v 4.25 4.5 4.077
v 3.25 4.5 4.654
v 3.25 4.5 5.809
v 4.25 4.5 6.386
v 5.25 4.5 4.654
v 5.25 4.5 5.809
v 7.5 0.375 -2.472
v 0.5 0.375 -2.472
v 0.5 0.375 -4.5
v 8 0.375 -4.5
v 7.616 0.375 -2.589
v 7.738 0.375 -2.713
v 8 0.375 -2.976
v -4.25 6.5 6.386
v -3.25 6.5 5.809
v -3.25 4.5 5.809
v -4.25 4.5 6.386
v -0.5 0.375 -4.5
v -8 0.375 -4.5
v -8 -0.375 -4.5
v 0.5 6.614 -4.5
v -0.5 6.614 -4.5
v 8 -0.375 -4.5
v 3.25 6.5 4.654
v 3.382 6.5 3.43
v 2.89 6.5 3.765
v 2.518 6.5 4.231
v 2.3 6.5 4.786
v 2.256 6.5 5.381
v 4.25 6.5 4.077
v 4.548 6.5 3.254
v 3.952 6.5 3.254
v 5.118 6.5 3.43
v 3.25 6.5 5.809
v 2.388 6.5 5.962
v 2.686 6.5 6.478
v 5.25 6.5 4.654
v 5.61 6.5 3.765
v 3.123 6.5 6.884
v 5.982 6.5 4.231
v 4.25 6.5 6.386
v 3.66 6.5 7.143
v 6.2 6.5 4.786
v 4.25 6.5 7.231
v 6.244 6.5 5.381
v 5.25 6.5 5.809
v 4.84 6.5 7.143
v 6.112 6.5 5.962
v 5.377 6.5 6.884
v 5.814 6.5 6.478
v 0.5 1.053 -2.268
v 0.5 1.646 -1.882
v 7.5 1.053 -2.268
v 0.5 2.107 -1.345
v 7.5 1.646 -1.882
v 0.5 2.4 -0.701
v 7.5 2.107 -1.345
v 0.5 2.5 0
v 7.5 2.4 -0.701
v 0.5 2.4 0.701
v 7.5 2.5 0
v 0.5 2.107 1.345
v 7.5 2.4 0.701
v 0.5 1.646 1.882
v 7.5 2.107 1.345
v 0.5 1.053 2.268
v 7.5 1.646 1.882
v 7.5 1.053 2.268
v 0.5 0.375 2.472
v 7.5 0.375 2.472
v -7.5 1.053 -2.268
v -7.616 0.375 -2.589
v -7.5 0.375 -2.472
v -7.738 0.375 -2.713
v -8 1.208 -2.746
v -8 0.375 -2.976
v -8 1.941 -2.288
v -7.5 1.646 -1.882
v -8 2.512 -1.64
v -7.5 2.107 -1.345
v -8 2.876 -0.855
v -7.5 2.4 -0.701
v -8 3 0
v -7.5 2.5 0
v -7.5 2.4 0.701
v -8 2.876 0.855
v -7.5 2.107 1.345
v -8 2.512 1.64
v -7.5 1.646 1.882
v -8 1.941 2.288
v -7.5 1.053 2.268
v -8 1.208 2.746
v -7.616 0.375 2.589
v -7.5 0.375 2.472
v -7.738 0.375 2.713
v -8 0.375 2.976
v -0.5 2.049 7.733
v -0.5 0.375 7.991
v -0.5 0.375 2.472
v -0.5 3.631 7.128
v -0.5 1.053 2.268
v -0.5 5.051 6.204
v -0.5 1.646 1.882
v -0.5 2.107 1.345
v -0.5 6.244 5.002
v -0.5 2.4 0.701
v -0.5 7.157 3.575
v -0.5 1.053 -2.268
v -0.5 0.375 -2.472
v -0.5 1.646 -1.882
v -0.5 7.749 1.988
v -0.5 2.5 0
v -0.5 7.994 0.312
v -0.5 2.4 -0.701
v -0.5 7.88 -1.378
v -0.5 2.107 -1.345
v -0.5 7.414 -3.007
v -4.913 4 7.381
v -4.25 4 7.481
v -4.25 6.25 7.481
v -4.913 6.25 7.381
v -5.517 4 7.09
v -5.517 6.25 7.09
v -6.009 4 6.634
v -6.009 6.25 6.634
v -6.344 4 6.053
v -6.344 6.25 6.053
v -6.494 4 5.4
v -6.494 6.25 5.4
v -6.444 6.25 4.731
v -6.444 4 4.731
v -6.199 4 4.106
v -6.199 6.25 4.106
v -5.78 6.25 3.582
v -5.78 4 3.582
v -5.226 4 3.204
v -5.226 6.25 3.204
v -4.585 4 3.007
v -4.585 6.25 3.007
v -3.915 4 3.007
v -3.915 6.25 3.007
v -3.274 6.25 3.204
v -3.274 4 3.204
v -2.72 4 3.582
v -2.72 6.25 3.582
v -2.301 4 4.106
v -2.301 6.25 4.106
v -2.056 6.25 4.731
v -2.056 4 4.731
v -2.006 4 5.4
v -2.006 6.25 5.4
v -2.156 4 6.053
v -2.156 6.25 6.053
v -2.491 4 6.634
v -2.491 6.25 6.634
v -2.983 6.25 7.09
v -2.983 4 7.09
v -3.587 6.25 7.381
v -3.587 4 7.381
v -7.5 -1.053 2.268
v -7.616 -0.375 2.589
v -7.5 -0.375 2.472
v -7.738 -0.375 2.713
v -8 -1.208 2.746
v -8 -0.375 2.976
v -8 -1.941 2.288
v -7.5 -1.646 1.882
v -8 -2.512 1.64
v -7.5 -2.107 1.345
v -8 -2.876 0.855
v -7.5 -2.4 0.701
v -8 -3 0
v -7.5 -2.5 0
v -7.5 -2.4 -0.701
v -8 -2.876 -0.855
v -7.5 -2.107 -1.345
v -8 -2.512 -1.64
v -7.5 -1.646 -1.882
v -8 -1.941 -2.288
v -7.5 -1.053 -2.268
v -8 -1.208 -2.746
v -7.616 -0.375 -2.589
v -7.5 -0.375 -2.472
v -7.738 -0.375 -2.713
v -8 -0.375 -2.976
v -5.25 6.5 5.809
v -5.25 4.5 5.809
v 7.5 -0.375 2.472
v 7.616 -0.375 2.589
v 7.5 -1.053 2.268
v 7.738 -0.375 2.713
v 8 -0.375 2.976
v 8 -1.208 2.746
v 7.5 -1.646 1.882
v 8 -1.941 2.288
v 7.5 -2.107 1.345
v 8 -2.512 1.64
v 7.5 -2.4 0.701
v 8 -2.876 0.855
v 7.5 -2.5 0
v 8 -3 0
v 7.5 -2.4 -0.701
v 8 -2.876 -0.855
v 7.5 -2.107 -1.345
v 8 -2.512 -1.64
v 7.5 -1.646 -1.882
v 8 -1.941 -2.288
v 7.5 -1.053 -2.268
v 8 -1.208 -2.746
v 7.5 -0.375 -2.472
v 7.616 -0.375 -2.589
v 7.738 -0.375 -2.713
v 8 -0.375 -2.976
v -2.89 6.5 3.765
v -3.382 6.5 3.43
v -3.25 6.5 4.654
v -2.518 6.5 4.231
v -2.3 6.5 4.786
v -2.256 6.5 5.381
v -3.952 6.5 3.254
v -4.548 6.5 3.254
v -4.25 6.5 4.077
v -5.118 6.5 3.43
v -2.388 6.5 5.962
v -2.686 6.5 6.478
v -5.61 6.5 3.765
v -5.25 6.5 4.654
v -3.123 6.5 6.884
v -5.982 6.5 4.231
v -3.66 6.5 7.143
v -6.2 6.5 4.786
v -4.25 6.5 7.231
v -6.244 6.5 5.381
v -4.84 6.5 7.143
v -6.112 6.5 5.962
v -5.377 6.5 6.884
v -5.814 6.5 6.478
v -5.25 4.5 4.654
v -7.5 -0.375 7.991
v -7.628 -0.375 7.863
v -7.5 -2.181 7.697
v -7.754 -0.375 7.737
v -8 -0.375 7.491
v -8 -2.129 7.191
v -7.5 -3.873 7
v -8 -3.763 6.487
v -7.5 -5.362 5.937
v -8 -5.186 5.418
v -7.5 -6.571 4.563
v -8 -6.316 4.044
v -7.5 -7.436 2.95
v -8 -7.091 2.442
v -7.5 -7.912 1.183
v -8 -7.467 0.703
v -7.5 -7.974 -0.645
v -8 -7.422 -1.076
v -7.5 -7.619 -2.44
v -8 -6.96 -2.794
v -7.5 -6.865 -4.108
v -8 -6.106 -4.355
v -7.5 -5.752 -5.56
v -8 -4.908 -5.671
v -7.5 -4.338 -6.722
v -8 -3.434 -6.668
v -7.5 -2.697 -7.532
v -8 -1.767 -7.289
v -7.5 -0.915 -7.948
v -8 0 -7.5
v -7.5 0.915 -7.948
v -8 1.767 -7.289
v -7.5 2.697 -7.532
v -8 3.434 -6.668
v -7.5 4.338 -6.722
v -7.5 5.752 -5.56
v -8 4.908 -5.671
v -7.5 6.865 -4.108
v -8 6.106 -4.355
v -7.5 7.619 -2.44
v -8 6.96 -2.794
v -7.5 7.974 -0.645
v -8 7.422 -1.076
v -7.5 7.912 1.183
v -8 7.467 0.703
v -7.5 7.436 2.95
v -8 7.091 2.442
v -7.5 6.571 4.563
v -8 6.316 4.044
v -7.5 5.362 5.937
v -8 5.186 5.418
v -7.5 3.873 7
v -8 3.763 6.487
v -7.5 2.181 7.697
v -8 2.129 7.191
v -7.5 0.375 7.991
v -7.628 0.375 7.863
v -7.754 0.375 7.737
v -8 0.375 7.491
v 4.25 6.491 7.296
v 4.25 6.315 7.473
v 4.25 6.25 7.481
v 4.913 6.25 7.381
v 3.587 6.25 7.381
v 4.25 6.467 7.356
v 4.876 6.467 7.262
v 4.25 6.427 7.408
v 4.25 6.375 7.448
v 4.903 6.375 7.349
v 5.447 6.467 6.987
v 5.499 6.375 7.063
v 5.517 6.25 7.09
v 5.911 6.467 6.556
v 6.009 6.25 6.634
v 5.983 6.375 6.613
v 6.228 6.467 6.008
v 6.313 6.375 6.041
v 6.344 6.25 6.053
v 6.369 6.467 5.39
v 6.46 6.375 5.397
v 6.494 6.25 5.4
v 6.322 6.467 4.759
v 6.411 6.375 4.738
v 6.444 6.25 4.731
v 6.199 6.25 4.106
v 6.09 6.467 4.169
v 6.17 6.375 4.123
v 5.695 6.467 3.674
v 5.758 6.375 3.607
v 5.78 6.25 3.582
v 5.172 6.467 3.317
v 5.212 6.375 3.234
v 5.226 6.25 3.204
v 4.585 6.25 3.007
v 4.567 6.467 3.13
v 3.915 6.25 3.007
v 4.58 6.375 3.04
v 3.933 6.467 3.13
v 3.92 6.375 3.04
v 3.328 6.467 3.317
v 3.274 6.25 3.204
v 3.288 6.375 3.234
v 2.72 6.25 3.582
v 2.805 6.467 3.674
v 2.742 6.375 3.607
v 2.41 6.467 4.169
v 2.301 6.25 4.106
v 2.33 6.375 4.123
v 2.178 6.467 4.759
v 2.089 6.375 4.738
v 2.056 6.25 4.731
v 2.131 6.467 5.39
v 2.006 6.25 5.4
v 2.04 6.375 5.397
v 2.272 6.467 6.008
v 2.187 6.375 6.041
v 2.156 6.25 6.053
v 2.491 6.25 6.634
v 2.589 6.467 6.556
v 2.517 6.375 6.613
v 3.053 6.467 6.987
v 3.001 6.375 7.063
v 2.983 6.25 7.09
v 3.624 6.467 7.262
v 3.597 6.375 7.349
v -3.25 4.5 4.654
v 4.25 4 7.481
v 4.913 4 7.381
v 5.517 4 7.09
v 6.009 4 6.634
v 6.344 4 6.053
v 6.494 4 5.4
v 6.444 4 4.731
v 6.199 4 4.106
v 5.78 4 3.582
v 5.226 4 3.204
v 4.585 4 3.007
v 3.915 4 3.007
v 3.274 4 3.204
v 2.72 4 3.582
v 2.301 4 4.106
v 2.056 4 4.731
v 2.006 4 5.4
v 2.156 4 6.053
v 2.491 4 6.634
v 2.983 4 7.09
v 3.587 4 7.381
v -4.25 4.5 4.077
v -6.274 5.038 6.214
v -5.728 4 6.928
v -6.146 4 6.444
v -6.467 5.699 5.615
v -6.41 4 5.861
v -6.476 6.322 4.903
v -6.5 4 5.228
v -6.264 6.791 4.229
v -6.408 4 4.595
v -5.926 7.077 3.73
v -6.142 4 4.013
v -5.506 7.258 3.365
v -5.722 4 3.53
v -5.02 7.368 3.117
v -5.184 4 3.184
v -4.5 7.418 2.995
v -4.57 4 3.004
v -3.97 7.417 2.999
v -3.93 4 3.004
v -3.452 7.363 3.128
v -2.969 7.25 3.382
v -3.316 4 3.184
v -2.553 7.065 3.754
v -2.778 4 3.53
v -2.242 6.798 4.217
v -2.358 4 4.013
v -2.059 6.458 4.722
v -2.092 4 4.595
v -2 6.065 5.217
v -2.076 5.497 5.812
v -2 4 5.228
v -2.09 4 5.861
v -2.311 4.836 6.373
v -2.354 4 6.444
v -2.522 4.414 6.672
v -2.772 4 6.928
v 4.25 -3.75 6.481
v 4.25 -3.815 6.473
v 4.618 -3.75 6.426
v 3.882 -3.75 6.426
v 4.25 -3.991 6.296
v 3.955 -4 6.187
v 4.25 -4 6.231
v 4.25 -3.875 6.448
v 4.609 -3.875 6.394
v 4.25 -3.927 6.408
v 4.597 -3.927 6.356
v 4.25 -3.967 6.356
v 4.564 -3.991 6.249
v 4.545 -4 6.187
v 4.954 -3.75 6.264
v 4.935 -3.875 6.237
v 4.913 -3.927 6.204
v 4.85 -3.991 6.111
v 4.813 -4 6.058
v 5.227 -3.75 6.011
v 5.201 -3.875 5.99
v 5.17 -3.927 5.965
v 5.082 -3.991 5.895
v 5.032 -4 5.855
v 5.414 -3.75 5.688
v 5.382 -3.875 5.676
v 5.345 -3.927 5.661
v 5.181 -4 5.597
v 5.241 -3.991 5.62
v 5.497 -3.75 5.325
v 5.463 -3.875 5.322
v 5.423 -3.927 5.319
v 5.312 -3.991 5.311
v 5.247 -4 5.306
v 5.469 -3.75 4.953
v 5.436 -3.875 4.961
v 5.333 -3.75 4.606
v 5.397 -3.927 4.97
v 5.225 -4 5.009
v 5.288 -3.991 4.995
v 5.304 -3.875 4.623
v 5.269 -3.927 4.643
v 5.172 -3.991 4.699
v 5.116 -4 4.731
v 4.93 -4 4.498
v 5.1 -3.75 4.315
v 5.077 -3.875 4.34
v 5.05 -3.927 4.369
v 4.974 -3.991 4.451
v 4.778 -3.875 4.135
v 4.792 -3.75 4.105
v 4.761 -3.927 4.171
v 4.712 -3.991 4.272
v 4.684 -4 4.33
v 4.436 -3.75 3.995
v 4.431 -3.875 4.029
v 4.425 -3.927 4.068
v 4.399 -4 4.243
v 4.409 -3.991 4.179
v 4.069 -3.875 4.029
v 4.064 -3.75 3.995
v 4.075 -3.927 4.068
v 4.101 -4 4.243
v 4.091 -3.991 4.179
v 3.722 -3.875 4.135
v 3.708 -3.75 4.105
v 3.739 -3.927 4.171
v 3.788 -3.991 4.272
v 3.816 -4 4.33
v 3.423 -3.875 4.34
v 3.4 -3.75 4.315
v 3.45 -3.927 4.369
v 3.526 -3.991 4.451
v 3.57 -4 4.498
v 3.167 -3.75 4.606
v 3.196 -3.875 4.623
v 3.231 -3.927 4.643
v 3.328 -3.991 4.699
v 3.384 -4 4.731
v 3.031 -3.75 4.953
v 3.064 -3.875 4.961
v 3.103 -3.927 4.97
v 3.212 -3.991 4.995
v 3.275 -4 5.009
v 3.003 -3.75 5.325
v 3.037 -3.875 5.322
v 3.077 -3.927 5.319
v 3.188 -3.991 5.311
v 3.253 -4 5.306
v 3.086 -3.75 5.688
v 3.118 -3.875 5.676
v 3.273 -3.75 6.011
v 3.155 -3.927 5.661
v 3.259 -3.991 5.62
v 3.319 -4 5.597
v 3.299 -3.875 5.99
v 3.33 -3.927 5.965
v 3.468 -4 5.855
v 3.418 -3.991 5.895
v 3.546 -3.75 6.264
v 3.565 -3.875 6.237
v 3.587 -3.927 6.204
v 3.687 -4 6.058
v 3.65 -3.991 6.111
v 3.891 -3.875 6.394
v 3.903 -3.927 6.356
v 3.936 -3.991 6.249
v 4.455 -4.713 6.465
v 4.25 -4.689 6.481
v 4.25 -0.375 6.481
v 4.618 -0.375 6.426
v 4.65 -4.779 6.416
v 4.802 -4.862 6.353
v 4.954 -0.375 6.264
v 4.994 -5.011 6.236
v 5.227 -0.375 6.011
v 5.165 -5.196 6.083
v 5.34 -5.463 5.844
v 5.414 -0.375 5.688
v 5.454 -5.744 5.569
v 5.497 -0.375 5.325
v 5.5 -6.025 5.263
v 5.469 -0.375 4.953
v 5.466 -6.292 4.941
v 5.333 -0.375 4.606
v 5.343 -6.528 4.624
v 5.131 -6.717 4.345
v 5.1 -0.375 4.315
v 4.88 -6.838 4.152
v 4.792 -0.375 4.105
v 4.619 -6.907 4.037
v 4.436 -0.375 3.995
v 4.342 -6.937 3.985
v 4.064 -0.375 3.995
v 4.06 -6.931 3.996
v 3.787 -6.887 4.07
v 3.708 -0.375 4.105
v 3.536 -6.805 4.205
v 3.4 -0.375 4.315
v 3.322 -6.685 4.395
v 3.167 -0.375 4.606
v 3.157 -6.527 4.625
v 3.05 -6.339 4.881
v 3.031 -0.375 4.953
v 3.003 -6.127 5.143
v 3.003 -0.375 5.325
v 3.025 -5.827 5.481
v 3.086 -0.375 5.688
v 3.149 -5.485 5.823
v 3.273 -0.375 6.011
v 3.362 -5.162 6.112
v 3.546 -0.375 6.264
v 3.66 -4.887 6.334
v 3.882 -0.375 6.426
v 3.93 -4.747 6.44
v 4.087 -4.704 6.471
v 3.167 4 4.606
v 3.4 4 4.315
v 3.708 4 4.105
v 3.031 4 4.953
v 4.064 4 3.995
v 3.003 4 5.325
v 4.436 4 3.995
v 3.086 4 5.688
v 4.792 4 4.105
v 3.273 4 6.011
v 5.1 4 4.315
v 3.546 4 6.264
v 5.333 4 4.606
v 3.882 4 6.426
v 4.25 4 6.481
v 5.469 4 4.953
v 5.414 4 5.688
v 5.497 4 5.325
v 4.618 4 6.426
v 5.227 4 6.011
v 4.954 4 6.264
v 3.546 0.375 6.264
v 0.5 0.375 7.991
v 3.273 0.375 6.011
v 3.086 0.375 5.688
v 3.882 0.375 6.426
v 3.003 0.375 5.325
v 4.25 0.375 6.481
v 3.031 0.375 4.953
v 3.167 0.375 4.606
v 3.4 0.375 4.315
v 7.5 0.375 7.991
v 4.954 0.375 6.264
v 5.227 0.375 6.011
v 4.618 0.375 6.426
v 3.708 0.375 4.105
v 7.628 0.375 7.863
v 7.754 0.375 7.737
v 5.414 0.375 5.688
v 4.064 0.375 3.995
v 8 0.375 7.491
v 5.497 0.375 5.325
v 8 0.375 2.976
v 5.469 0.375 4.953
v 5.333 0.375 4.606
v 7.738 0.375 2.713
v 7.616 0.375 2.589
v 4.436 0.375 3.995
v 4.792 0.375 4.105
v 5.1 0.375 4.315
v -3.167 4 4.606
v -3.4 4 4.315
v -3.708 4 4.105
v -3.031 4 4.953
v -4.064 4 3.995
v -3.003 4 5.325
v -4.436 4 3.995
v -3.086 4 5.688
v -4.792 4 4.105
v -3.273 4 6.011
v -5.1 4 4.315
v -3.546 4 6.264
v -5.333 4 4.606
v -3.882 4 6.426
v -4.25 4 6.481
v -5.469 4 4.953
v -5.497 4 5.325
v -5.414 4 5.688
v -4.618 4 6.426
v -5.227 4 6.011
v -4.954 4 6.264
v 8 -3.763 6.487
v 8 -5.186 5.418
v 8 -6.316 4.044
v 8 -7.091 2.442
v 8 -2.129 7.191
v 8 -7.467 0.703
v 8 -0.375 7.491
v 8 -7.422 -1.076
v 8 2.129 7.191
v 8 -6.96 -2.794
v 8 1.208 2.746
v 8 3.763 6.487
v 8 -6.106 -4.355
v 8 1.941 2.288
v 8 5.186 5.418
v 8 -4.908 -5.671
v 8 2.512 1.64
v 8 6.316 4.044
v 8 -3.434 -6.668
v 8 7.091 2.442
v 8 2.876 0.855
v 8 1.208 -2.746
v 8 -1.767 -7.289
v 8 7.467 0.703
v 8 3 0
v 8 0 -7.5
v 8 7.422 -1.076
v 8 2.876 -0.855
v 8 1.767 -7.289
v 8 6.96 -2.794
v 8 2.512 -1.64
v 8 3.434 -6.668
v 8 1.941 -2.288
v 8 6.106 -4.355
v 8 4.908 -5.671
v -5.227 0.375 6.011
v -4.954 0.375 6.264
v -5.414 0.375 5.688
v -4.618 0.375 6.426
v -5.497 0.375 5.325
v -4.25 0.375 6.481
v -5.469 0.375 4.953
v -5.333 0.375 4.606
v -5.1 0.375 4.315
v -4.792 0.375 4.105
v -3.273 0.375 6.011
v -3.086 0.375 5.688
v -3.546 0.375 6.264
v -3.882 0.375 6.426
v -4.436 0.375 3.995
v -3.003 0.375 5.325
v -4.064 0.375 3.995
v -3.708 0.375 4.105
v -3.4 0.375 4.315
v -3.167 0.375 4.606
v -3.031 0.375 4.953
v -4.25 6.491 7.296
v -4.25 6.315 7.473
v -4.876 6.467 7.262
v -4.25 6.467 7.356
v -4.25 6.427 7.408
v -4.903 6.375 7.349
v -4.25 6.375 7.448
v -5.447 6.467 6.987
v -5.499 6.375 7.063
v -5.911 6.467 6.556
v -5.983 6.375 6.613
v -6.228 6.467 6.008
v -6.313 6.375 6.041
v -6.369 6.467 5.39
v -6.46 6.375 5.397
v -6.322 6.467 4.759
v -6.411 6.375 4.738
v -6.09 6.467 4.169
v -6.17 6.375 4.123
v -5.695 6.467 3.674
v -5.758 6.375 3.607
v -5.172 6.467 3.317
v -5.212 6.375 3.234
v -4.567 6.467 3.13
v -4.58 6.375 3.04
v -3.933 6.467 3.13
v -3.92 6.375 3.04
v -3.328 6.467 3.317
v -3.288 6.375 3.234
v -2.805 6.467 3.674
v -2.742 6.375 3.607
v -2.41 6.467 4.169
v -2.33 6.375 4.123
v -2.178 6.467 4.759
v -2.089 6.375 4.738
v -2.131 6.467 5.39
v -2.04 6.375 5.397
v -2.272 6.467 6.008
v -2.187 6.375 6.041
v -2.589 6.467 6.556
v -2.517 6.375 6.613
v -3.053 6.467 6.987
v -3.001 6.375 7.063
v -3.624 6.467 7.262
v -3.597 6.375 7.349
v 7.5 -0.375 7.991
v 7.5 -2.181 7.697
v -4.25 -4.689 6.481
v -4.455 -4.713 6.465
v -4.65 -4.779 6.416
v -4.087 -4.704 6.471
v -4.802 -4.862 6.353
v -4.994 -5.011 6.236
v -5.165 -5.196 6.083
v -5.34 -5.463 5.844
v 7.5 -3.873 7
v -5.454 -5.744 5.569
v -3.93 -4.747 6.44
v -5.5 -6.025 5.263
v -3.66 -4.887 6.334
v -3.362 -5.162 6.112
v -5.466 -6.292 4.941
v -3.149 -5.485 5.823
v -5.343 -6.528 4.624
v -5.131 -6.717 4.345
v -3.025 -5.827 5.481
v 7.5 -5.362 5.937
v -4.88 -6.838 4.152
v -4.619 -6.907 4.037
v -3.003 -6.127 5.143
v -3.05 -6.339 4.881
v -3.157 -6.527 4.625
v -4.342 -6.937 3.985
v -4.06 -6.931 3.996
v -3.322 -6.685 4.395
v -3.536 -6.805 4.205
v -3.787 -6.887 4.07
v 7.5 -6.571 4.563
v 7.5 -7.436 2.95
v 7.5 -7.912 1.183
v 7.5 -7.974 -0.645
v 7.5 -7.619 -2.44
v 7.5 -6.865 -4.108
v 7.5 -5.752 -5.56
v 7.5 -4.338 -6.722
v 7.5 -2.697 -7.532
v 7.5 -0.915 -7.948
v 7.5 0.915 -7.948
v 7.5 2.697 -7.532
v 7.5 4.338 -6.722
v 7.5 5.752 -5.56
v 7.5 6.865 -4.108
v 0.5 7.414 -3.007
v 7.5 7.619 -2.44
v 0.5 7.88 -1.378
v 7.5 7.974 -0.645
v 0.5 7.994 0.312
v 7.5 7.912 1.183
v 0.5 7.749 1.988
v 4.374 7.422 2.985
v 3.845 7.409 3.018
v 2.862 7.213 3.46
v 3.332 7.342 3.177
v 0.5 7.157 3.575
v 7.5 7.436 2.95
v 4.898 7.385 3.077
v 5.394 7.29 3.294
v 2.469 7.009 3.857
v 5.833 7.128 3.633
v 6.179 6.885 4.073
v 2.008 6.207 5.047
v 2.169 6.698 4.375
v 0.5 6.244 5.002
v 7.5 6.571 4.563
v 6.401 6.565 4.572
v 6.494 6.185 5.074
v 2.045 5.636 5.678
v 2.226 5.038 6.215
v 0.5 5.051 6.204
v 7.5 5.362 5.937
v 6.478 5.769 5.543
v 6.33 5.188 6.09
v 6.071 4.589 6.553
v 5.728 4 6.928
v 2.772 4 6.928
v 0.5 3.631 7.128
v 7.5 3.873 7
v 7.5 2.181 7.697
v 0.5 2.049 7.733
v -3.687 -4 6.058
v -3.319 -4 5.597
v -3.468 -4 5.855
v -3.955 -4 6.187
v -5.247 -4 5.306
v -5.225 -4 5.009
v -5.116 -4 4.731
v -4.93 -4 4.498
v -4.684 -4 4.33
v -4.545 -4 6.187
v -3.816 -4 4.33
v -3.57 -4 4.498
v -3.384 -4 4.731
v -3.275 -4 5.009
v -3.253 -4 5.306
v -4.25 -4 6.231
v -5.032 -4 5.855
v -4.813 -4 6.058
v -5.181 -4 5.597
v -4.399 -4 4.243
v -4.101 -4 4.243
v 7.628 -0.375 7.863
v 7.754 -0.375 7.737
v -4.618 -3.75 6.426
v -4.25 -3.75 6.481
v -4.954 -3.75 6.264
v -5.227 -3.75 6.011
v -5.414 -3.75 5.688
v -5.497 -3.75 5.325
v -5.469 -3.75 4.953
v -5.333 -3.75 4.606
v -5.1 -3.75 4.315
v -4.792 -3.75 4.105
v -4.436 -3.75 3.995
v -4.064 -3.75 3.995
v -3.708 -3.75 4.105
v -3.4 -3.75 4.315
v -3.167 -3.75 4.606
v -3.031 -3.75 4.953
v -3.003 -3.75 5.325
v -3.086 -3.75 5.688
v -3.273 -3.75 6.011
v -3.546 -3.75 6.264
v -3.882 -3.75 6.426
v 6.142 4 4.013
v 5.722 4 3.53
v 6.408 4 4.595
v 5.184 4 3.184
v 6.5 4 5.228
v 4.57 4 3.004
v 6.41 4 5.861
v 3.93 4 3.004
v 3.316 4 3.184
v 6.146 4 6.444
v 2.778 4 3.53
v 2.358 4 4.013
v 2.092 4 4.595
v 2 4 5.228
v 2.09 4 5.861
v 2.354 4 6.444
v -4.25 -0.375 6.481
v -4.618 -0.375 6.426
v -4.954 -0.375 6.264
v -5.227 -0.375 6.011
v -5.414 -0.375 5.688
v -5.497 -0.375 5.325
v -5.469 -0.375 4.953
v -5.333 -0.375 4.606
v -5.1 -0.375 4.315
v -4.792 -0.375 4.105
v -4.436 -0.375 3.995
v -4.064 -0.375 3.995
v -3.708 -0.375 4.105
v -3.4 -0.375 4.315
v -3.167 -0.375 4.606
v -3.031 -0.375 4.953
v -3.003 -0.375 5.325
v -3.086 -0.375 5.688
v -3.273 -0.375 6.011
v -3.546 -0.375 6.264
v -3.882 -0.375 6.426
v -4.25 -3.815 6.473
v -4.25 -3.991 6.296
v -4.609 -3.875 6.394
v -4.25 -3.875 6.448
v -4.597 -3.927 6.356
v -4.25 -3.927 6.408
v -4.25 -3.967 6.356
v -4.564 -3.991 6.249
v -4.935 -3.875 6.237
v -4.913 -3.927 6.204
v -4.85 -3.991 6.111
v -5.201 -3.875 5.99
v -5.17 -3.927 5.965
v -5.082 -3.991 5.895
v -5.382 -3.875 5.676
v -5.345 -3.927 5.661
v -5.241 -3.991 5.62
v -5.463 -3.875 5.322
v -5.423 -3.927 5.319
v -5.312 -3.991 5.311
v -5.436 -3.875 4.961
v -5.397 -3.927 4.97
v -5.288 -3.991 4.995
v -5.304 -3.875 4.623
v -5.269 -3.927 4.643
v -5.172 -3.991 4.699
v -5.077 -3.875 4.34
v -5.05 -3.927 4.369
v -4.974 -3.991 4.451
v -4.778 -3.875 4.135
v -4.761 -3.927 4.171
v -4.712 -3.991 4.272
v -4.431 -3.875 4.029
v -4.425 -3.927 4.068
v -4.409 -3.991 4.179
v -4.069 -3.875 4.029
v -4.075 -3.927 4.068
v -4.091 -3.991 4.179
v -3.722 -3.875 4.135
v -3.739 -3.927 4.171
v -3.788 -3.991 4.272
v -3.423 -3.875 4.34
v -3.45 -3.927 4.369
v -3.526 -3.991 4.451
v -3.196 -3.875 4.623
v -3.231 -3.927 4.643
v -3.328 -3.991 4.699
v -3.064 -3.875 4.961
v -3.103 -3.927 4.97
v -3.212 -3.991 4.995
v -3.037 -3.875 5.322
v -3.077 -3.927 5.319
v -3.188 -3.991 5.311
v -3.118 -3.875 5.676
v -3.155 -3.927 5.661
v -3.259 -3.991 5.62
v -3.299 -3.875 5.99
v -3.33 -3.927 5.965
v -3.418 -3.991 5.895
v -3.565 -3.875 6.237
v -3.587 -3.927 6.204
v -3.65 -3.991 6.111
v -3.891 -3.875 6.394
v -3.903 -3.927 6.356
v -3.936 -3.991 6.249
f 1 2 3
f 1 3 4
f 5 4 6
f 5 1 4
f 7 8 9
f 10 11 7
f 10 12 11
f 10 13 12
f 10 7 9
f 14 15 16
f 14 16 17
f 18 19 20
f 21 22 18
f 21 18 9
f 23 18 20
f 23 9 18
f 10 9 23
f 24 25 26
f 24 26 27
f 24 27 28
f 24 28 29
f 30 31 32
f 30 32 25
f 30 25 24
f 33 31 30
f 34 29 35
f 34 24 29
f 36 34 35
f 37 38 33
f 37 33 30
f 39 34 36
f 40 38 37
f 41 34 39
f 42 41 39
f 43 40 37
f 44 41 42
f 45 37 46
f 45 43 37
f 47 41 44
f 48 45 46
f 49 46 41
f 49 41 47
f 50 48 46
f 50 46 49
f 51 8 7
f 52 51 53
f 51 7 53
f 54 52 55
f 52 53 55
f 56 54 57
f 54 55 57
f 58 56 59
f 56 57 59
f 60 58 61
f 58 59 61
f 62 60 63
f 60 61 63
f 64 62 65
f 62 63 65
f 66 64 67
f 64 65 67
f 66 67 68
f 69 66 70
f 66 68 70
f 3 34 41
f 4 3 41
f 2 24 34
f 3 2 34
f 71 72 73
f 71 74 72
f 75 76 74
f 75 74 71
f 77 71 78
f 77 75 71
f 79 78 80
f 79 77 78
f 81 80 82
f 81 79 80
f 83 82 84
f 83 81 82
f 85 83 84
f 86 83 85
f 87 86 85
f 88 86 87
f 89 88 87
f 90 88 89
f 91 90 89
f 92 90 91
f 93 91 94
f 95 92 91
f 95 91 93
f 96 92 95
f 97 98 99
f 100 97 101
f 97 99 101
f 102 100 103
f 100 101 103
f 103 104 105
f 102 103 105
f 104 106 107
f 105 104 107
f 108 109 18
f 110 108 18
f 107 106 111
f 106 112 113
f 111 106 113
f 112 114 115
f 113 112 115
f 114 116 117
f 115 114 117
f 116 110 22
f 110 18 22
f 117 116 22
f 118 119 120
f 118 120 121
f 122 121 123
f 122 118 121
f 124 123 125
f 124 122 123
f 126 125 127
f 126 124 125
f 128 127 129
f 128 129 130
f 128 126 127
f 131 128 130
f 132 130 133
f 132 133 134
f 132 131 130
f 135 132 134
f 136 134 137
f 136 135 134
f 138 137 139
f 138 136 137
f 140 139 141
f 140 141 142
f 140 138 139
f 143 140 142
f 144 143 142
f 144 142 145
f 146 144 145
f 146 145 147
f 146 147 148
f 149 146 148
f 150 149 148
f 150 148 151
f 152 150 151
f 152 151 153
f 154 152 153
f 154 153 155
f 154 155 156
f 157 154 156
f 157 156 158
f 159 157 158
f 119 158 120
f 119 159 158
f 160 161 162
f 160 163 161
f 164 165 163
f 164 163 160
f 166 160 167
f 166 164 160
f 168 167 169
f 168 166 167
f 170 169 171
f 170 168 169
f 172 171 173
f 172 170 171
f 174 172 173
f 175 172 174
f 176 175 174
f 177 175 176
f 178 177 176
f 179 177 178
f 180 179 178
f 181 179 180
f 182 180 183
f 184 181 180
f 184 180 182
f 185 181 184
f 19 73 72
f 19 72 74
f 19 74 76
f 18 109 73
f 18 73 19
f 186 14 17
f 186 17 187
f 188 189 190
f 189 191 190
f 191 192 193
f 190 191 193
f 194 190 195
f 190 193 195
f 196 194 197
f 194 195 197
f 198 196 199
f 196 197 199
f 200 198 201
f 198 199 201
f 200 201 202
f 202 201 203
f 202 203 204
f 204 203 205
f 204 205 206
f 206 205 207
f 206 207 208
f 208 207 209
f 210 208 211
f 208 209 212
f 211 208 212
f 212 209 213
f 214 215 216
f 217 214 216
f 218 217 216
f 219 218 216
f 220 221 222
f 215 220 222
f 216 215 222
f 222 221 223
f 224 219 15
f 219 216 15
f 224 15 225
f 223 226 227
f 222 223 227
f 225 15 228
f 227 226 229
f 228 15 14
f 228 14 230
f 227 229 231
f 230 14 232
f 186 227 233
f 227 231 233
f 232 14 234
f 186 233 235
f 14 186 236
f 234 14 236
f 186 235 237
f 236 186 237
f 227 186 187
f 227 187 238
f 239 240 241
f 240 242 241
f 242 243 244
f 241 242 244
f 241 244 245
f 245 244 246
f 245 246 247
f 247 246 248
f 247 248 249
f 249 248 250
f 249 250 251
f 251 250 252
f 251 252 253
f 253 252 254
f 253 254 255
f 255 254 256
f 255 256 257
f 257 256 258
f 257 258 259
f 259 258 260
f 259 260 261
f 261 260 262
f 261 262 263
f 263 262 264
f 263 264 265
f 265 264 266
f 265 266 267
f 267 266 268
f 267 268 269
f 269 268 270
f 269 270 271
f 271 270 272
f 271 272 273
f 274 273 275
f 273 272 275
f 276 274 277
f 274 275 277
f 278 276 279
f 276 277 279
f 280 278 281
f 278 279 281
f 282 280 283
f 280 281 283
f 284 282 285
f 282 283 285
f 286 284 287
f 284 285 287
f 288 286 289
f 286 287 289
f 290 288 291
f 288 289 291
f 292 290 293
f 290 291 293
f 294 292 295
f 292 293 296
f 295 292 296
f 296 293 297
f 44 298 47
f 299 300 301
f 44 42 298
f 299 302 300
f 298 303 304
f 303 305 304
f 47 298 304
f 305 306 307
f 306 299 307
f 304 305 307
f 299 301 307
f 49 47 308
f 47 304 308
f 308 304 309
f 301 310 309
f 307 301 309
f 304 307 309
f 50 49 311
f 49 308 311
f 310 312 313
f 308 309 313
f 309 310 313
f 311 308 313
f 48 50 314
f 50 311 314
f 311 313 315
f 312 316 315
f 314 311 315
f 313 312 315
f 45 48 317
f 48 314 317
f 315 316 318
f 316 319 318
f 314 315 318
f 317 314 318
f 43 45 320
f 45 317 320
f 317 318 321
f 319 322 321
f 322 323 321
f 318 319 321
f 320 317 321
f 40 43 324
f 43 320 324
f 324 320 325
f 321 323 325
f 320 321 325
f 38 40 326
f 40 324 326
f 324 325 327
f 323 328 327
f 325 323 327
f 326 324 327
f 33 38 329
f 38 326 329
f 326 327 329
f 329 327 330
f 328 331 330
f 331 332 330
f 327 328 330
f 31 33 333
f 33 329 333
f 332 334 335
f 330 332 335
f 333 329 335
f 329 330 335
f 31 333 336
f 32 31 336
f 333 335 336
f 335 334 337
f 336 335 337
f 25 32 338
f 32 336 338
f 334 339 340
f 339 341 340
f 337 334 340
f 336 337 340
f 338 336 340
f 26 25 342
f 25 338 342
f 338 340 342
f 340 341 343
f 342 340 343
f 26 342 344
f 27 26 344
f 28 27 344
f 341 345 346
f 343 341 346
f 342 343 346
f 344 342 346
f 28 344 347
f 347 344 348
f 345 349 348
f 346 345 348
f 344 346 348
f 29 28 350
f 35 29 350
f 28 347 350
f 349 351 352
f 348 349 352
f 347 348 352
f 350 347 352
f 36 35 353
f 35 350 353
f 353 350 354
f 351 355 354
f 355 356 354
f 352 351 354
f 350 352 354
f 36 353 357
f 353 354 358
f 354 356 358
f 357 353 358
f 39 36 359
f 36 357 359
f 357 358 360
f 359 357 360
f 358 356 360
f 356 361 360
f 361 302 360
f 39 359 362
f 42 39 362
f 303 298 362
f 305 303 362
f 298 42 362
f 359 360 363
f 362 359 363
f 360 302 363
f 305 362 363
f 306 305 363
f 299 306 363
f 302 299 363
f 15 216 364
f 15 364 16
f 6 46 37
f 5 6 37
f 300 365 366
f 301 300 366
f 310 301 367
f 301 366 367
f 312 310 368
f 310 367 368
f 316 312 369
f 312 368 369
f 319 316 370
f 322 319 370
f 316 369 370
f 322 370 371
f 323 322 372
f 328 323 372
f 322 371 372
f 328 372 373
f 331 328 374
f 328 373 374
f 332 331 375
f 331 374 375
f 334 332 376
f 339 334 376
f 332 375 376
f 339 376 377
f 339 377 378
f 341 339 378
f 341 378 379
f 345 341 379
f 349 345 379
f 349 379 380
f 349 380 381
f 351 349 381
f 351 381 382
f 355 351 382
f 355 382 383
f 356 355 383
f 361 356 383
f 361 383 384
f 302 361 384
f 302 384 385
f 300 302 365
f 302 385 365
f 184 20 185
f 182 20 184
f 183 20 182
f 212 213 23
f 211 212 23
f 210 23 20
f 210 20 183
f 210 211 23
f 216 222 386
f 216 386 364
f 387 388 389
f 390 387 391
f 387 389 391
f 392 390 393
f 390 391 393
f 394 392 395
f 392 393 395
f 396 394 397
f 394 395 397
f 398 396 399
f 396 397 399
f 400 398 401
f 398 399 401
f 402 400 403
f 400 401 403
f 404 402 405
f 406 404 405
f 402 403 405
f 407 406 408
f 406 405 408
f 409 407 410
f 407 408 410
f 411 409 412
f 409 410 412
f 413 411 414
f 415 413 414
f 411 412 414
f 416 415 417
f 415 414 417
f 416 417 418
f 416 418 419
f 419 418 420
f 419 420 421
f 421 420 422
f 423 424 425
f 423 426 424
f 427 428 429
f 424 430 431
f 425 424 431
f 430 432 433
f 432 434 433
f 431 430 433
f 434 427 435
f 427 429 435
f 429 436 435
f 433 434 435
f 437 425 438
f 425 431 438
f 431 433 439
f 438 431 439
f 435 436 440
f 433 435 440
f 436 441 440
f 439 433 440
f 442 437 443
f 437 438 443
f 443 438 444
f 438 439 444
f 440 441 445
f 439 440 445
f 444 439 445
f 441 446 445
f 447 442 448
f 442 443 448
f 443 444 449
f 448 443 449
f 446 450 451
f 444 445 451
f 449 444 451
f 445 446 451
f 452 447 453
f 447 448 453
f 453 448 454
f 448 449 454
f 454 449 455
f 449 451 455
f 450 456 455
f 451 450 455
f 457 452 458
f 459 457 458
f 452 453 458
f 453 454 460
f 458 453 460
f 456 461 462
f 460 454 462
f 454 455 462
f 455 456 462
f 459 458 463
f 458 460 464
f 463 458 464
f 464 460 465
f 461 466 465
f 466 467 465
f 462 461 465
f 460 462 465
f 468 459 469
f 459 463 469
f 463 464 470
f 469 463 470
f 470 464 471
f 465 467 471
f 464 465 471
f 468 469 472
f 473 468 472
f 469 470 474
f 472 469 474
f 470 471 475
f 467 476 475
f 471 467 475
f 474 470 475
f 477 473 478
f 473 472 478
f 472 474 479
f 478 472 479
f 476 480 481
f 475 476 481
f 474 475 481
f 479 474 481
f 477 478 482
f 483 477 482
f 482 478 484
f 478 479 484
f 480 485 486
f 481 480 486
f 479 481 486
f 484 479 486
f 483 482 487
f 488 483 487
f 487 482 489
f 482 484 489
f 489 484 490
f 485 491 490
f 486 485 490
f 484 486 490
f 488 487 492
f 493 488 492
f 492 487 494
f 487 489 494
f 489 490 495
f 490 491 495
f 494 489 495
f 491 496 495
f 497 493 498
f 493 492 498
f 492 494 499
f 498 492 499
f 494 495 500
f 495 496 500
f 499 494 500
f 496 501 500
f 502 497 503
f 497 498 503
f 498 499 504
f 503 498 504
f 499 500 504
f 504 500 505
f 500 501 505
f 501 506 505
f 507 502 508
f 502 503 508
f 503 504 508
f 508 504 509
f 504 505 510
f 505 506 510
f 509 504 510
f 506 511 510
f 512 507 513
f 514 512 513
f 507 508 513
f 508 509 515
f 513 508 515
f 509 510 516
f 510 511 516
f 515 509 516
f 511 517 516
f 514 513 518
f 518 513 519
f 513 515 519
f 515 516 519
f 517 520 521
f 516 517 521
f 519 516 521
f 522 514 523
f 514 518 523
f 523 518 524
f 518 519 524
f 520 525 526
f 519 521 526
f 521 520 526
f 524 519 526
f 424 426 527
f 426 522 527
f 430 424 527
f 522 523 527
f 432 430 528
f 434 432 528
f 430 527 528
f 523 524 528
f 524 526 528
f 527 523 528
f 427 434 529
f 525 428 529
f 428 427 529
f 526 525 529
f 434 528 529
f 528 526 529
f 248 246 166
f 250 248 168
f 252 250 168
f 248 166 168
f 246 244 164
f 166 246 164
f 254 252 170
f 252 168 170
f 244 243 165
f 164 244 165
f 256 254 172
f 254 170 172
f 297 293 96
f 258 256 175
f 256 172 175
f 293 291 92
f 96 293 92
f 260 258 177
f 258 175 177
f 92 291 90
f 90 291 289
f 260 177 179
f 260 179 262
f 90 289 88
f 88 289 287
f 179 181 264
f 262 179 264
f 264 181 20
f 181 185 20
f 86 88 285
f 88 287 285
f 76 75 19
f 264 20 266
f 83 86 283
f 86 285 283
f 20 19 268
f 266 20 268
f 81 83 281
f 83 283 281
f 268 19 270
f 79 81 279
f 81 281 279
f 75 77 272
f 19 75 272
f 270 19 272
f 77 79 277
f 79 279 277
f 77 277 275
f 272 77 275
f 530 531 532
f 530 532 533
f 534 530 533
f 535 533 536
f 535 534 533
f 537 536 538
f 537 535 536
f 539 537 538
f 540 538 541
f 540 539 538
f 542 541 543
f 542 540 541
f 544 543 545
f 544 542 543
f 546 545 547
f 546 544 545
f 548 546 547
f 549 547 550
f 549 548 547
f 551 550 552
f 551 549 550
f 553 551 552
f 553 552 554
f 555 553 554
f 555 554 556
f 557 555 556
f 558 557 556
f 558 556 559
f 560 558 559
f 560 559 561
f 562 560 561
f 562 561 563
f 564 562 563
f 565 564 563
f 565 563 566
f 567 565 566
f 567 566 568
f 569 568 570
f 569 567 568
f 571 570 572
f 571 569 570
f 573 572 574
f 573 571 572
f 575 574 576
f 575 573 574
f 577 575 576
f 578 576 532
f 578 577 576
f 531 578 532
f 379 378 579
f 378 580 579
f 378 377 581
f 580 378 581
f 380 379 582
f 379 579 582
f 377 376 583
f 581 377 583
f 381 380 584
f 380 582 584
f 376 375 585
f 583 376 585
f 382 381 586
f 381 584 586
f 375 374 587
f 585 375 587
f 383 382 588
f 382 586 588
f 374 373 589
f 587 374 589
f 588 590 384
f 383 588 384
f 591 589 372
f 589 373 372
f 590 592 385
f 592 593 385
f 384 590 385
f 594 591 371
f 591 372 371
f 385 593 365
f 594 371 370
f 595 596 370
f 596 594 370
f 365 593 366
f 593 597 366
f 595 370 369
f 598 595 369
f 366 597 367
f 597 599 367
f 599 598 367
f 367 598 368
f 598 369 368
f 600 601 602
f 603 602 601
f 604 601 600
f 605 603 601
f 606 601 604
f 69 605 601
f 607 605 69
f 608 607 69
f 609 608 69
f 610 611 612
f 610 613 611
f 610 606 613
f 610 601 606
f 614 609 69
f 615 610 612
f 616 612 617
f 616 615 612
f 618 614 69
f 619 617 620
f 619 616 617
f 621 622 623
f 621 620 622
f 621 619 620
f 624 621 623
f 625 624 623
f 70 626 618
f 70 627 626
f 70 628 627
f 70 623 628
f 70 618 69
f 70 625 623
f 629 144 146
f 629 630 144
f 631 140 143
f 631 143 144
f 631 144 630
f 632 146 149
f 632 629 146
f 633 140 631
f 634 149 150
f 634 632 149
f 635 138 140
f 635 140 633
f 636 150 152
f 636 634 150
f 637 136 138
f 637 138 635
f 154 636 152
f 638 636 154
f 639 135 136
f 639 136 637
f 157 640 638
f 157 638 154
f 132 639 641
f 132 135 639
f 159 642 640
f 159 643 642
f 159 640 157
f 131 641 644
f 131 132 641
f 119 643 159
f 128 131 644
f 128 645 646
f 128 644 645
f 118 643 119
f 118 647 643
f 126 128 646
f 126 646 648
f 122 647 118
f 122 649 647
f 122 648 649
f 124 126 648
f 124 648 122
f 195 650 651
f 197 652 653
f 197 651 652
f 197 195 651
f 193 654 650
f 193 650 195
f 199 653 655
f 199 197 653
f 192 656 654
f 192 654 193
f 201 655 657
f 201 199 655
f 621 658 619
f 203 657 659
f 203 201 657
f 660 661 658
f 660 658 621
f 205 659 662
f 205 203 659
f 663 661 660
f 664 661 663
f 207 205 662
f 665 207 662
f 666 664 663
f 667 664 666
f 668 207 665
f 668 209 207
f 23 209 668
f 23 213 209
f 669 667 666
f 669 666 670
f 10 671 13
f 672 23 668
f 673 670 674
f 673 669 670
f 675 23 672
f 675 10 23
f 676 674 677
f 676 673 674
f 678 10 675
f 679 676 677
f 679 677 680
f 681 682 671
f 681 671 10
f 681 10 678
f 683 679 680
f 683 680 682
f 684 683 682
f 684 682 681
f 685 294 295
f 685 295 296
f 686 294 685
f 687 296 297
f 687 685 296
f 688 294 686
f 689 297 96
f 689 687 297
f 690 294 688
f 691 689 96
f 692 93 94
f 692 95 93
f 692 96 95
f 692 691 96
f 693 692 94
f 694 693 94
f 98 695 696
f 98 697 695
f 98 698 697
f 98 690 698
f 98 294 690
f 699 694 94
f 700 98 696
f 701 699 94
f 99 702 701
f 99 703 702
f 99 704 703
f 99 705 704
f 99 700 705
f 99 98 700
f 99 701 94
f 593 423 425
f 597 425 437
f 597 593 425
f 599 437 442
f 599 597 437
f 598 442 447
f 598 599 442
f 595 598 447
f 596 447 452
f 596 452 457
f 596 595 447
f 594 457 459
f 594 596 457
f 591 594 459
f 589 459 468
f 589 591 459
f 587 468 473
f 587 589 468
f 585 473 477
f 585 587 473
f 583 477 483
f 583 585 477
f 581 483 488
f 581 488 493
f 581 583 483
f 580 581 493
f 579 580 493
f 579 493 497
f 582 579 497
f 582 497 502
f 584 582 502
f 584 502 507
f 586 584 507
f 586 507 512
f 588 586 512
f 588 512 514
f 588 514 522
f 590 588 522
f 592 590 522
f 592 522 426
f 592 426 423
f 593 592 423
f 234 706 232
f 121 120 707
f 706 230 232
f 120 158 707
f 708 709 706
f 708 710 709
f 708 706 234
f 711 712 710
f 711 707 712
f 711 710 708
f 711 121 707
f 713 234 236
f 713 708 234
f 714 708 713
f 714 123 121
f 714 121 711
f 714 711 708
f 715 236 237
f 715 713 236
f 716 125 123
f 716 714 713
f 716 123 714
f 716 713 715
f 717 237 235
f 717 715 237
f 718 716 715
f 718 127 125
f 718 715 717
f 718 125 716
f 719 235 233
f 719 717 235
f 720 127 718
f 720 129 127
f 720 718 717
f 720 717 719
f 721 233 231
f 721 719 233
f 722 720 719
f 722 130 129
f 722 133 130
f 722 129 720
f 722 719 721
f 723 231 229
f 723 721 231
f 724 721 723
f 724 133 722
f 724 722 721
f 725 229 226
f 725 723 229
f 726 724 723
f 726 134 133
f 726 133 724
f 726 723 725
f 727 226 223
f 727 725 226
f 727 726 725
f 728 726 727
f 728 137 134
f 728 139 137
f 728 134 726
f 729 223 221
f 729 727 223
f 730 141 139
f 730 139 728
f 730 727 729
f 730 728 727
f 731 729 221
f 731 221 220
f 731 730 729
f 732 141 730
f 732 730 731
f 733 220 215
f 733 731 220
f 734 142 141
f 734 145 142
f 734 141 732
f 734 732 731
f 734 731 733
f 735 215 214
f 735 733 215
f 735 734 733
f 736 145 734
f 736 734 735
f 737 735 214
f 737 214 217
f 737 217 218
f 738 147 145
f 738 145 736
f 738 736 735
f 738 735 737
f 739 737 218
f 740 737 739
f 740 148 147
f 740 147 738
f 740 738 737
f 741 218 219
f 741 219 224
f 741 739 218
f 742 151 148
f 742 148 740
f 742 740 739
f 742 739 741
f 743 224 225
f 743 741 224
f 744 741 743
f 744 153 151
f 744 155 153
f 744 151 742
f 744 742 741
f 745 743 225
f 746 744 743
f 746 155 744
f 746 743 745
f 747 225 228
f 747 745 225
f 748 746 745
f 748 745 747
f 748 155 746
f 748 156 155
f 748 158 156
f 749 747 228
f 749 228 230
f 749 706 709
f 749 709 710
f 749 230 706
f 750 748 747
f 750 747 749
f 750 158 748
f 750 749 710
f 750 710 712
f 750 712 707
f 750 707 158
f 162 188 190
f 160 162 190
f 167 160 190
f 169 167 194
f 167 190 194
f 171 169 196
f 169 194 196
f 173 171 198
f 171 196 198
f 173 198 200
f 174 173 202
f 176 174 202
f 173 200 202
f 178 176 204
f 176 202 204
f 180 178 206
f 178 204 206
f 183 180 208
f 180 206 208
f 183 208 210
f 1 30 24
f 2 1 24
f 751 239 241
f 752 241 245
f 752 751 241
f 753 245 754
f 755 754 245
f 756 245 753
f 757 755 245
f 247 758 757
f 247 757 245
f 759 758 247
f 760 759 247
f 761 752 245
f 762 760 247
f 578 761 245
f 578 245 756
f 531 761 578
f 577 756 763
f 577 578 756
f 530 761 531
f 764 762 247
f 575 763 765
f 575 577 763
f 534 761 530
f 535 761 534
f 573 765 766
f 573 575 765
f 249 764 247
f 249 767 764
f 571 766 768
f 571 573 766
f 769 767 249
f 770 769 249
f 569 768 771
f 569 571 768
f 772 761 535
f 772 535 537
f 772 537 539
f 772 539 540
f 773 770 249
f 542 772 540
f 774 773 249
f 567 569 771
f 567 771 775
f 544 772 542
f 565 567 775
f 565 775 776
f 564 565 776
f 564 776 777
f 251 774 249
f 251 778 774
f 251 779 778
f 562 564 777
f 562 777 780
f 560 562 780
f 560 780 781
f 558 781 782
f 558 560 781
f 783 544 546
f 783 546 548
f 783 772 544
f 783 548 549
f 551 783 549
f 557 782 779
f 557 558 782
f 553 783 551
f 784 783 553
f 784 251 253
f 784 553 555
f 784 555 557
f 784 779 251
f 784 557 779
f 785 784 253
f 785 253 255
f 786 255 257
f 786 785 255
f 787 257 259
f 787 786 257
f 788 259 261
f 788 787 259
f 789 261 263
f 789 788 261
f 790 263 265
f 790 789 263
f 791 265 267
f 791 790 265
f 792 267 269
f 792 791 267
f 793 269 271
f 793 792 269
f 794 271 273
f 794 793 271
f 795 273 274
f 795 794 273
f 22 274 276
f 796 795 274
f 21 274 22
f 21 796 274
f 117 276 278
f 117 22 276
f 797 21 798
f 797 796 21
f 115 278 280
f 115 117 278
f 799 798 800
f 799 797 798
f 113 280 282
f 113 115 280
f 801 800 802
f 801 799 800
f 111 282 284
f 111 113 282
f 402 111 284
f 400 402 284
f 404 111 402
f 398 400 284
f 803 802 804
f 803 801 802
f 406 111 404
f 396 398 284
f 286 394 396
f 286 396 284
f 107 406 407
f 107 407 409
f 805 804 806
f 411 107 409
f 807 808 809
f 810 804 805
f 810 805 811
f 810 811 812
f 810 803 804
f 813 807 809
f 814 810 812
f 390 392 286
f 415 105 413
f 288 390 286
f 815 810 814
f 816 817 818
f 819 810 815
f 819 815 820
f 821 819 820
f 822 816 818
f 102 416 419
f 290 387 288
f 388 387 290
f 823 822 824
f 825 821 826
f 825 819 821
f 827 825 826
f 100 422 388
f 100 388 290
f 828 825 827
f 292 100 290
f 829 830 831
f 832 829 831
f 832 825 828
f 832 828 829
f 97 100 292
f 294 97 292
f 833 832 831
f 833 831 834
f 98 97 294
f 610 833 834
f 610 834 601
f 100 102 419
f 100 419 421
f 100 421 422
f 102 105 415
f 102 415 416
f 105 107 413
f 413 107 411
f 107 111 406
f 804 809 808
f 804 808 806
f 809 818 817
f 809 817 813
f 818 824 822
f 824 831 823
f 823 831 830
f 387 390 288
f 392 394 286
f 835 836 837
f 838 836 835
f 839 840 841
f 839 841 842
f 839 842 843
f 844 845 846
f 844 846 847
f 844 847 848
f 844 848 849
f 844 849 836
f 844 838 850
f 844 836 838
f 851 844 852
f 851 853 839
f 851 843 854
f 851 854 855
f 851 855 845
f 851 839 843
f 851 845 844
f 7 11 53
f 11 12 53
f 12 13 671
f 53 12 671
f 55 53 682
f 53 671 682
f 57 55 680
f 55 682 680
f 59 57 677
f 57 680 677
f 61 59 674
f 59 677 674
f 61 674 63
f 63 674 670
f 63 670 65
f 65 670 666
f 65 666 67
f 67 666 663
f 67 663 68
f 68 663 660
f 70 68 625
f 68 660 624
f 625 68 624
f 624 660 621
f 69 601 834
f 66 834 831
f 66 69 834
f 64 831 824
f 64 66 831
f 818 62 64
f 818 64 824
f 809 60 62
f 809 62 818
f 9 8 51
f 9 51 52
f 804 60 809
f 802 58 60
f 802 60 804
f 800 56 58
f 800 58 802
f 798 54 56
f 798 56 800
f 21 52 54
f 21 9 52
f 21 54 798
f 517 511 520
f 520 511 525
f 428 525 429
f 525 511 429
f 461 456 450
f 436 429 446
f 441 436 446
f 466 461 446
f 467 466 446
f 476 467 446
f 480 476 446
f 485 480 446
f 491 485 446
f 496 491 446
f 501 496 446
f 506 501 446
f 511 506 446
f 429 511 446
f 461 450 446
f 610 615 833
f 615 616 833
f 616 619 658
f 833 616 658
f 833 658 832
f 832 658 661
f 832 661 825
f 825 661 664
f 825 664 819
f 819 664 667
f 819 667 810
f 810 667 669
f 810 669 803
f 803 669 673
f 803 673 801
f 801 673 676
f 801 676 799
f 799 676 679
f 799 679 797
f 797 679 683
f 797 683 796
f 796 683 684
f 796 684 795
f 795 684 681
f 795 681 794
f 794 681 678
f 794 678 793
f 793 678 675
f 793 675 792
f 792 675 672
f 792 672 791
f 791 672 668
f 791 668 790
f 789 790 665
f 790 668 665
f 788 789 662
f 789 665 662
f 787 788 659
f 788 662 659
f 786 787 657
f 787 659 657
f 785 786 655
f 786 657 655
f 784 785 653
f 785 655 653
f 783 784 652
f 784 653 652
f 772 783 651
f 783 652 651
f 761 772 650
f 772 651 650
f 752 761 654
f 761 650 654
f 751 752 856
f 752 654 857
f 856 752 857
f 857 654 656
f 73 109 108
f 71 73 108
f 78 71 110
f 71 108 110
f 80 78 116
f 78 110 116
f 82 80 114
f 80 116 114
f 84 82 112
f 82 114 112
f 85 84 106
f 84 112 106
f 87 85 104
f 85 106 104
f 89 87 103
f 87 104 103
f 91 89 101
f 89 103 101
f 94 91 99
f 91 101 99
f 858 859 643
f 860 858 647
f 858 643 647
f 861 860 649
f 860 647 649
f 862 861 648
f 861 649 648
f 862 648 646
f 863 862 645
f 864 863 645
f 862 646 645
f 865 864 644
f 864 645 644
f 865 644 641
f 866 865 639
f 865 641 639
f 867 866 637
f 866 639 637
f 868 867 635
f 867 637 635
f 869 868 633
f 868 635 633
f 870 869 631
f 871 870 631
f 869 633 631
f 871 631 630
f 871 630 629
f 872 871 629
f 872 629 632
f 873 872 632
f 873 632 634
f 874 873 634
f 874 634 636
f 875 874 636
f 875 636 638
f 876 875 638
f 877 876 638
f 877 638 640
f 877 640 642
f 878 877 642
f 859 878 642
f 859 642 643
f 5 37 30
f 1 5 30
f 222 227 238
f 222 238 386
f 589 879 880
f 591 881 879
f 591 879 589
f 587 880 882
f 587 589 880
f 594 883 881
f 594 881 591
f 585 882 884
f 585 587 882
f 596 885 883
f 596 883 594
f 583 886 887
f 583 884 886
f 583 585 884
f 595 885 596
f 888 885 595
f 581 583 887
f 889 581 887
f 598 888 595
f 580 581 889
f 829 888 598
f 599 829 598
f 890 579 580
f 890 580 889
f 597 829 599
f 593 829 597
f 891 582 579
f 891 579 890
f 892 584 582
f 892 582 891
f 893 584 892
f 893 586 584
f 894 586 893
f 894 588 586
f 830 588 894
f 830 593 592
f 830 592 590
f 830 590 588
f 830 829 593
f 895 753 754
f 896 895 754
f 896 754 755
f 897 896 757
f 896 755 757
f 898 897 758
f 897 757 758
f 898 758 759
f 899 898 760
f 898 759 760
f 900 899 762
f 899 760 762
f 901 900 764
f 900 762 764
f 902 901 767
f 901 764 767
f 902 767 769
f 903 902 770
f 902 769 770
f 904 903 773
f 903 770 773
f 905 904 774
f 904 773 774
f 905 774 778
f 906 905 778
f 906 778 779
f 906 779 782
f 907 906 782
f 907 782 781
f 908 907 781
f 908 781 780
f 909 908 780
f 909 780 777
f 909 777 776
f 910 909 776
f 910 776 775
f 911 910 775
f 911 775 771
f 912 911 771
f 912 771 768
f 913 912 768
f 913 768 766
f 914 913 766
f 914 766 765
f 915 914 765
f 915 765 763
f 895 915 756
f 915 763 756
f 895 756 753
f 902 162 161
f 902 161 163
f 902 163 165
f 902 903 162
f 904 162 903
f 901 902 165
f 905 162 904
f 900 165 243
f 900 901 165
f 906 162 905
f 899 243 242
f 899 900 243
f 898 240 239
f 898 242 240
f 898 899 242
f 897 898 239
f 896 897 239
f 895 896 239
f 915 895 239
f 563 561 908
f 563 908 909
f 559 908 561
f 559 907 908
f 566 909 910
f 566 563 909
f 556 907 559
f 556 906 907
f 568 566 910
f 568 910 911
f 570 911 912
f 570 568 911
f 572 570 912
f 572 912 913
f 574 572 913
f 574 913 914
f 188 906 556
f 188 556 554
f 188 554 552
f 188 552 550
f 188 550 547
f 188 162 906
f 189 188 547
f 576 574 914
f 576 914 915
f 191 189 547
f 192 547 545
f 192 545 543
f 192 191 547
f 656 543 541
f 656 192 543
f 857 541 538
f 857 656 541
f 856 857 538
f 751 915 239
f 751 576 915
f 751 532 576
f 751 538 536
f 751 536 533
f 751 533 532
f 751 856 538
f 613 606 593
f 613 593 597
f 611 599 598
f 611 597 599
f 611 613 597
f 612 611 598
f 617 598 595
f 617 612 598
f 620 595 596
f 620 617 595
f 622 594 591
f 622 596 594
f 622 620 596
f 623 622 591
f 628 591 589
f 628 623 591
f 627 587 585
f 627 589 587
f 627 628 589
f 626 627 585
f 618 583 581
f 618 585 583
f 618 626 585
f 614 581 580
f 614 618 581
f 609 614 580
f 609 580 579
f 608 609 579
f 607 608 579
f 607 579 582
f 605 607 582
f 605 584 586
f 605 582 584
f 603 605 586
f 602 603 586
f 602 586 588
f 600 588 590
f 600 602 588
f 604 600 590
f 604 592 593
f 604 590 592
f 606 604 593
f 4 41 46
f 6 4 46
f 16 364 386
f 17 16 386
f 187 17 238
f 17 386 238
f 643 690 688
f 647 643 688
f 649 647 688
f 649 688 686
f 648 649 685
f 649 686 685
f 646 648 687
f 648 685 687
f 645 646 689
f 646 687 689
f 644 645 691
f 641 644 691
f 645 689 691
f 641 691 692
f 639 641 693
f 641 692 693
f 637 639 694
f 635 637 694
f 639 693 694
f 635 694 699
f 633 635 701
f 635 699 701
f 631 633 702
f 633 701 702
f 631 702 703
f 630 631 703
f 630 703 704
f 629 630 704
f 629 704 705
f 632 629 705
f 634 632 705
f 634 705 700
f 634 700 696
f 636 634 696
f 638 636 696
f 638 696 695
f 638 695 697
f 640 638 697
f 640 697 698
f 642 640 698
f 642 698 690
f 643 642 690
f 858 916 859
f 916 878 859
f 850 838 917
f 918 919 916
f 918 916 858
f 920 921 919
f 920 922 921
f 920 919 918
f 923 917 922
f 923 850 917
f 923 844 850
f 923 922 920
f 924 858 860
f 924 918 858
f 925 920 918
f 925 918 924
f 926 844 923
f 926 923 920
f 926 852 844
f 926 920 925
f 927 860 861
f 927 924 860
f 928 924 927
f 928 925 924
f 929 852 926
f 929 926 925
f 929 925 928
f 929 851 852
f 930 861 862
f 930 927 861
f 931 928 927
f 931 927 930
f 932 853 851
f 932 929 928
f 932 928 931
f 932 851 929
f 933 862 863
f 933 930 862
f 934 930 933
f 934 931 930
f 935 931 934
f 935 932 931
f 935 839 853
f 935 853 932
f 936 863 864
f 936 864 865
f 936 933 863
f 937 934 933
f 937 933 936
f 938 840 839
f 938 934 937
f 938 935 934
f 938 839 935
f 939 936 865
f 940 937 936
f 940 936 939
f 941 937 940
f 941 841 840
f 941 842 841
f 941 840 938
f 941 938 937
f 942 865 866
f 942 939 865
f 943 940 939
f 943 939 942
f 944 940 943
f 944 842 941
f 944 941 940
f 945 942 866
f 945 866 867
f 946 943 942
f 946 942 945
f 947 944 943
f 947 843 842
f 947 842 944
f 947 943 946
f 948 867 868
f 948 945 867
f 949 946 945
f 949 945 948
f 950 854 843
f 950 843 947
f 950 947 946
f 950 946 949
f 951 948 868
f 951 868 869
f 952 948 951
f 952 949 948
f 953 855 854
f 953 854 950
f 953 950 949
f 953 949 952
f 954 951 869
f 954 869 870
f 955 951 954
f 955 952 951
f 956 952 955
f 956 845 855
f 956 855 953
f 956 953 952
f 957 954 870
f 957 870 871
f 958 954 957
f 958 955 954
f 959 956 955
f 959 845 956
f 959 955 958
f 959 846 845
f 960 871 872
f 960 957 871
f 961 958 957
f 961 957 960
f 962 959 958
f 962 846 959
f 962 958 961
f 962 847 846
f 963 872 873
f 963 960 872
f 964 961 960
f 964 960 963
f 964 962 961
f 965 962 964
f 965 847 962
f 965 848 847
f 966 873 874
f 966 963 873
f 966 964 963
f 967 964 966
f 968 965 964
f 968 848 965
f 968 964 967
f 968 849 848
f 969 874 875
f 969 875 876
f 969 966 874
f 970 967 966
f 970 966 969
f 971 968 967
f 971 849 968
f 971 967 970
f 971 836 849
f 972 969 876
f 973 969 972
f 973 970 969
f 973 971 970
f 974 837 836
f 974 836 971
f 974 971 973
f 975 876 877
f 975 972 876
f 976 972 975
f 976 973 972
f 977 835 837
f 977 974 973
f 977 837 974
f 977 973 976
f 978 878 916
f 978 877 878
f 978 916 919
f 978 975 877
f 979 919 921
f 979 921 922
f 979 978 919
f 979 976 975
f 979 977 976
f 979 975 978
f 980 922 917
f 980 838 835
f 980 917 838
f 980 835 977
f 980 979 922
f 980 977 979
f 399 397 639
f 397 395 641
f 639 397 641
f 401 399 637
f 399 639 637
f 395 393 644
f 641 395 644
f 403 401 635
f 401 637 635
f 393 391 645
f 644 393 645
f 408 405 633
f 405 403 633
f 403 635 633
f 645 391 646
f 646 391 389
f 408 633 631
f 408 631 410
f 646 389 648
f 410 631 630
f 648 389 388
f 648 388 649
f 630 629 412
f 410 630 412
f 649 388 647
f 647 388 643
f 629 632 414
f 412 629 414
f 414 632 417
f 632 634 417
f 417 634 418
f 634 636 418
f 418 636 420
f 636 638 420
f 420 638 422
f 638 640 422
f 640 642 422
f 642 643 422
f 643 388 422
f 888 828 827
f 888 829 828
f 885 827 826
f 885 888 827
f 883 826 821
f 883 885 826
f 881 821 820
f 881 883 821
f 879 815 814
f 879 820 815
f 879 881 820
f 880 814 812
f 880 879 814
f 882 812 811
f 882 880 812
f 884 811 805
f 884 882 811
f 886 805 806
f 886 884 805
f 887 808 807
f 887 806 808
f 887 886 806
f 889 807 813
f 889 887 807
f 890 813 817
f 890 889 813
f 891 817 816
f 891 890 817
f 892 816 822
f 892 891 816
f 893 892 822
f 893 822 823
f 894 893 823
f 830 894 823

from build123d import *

# Parameters (mm, degrees)
SKETCH1_R           = 8
BOSS_EXTRUDE1_DEPTH = 8
SKETCH2_R           = 2.5
CUT_EXTRUDE1_DEPTH  = 17
CUT_EXTRUDE2_DEPTH  = 17
SKETCH6_W           = 1
SKETCH6_H           = 8.375
CUT_EXTRUDE3_DEPTH  = 13.491206104
CUT_EXTRUDE4_START  = -8.625
SKETCH7_R           = 1.25
CUT_EXTRUDE4_DEPTH  = 18
SKETCH8_R           = 2.25
CUT_EXTRUDE5_DEPTH  = 5.0000001
SKETCH9_R           = 2.25
BOSS_EXTRUDE2_DEPTH = 2.5
SKETCH10_R          = 1.25
BOSS_EXTRUDE3_DEPTH = 10.5
FILLET1_R           = 0.25
CUT_EXTRUDE6_DEPTH  = 2
CHAMFER1_SIZE       = 0.5


with BuildPart() as part:
    # Sketch1 → Boss-Extrude1 (new body, symmetric)
    with BuildSketch(Plane(origin=(0, 0, 0), x_dir=(0, 0, -1), z_dir=(1, 0, 0))):
        Circle(SKETCH1_R)
    extrude(amount=BOSS_EXTRUDE1_DEPTH, both=True)

    # Sketch2 → Cut-Extrude1 (cut, through all)
    with BuildSketch(Plane(origin=(8, 0, 0), x_dir=(0, 0, -1), z_dir=(1, 0, 0))):
        Circle(SKETCH2_R)
    extrude(amount=-CUT_EXTRUDE1_DEPTH, mode=Mode.SUBTRACT)

    # Sketch5 → Cut-Extrude2 (cut, through all)
    with BuildSketch(Plane(origin=(8, 0, 0), x_dir=(0, 0, -1), z_dir=(1, 0, 0))):
        with BuildLine():
            Line((-7.991206104, 0.375), (4.5, 0.375))
            Line((4.5, 0.375), (4.5, -0.375))
            Line((4.5, -0.375), (-7.991206104, -0.375))
            ThreePointArc((-7.991206104, -0.375), (-8, 0), (-7.991206104, 0.375))
        make_face()
    extrude(amount=-CUT_EXTRUDE2_DEPTH, mode=Mode.SUBTRACT)

    # Sketch6 → Cut-Extrude3 (cut, through all)
    with BuildSketch(Plane.XY.offset(-4.5)):
        with Locations((0, 3.8125)):
            Rectangle(SKETCH6_W, SKETCH6_H)
    extrude(amount=CUT_EXTRUDE3_DEPTH, mode=Mode.SUBTRACT)

    # Sketch7 → Cut-Extrude4 (cut)
    with BuildSketch(Plane(origin=(0, -0.375, 0), x_dir=(1, 0, 0), z_dir=(0, 1, 0)).offset(CUT_EXTRUDE4_START)):
        with Locations(Location((4.25, -5.231460548, 0), (0, 0, 270))):  # turned: the seam where the file's is
            Circle(SKETCH7_R)
    cut_extrude4 = extrude(amount=CUT_EXTRUDE4_DEPTH, mode=Mode.SUBTRACT)

    # Sketch8 → Cut-Extrude5 (cut, through all)
    with BuildSketch(Plane(origin=(0, 4, 0), x_dir=(-1, 0, 0), z_dir=(0, 1, 0))):
        with Locations((-4.25, 5.231460548)):
            Circle(SKETCH8_R)
    cut_extrude5 = extrude(amount=CUT_EXTRUDE5_DEPTH, mode=Mode.SUBTRACT)

    # Mirror1: Cut-Extrude4, Cut-Extrude5 across plane
    add(cut_extrude4.mirror(Plane(origin=(0, 0, 0), x_dir=(0, 0, 1), z_dir=(1, 0, 0))), mode=Mode.SUBTRACT)
    add(cut_extrude5.mirror(Plane(origin=(0, 0, 0), x_dir=(0, 0, 1), z_dir=(1, 0, 0))), mode=Mode.SUBTRACT)

    # Chamfer1
    chamfer1_edges = [part.edges().sort_by_distance(p)[0] for p in [
        (-8, -2.5, 0),
        (8, -2.5, 0),
        (-8, 0, -8),
        (8, 0, -8),
        (-8, 2.5, 0),
        (8, 2.5, 0),
    ]]
    chamfer(chamfer1_edges, length=CHAMFER1_SIZE)


with BuildPart() as body_2:
    # Sketch9 → Boss-Extrude2 (new body)
    with BuildSketch(Plane(origin=(0, 4, 0), x_dir=(1, 0, 0), z_dir=(0, 1, 0))):
        with Locations(Location((4.25, -5.231460548, 0), (0, 0, 270))):  # turned: the seam where the file's is
            Circle(SKETCH9_R)
    extrude(amount=BOSS_EXTRUDE2_DEPTH)

    # Sketch10 → Boss-Extrude3 (add)
    with BuildSketch(Plane(origin=(0, 6.5, 0), x_dir=(1, 0, 0), z_dir=(0, 1, 0))):
        with Locations(Location((4.25, -5.231460548, 0), (0, 0, 270))):  # turned: the seam where the file's is
            Circle(SKETCH10_R)
    extrude(amount=-BOSS_EXTRUDE3_DEPTH)

    # Fillet1
    fillet1_edges = [body_2.edges().sort_by_distance(p)[0] for p in [
        (4.25, 6.5, 2.981460548),
        (4.25, -4, 3.981460548),
    ]]
    fillet(fillet1_edges, radius=FILLET1_R)

    # Sketch11 → Cut-Extrude6 (cut)
    with BuildSketch(Plane(origin=(0, 6.5, 0), x_dir=(1, 0, 0), z_dir=(0, 1, 0))):
        Polygon((4.25, -4.07676001), (3.25, -4.654110279), (3.25, -5.808810817), (4.25, -6.386161086), (5.25, -5.808810817), (5.25, -4.654110279), align=None)
    extrude(amount=-CUT_EXTRUDE6_DEPTH, mode=Mode.SUBTRACT)


with BuildPart() as body_3:
    # Mirror2: mirrored copy
    add(body_2.part.mirror(Plane(origin=(0, 0, 0), x_dir=(0, 0, 1), z_dir=(1, 0, 0))))


solid = Compound([part.part, body_2.part, body_3.part])
